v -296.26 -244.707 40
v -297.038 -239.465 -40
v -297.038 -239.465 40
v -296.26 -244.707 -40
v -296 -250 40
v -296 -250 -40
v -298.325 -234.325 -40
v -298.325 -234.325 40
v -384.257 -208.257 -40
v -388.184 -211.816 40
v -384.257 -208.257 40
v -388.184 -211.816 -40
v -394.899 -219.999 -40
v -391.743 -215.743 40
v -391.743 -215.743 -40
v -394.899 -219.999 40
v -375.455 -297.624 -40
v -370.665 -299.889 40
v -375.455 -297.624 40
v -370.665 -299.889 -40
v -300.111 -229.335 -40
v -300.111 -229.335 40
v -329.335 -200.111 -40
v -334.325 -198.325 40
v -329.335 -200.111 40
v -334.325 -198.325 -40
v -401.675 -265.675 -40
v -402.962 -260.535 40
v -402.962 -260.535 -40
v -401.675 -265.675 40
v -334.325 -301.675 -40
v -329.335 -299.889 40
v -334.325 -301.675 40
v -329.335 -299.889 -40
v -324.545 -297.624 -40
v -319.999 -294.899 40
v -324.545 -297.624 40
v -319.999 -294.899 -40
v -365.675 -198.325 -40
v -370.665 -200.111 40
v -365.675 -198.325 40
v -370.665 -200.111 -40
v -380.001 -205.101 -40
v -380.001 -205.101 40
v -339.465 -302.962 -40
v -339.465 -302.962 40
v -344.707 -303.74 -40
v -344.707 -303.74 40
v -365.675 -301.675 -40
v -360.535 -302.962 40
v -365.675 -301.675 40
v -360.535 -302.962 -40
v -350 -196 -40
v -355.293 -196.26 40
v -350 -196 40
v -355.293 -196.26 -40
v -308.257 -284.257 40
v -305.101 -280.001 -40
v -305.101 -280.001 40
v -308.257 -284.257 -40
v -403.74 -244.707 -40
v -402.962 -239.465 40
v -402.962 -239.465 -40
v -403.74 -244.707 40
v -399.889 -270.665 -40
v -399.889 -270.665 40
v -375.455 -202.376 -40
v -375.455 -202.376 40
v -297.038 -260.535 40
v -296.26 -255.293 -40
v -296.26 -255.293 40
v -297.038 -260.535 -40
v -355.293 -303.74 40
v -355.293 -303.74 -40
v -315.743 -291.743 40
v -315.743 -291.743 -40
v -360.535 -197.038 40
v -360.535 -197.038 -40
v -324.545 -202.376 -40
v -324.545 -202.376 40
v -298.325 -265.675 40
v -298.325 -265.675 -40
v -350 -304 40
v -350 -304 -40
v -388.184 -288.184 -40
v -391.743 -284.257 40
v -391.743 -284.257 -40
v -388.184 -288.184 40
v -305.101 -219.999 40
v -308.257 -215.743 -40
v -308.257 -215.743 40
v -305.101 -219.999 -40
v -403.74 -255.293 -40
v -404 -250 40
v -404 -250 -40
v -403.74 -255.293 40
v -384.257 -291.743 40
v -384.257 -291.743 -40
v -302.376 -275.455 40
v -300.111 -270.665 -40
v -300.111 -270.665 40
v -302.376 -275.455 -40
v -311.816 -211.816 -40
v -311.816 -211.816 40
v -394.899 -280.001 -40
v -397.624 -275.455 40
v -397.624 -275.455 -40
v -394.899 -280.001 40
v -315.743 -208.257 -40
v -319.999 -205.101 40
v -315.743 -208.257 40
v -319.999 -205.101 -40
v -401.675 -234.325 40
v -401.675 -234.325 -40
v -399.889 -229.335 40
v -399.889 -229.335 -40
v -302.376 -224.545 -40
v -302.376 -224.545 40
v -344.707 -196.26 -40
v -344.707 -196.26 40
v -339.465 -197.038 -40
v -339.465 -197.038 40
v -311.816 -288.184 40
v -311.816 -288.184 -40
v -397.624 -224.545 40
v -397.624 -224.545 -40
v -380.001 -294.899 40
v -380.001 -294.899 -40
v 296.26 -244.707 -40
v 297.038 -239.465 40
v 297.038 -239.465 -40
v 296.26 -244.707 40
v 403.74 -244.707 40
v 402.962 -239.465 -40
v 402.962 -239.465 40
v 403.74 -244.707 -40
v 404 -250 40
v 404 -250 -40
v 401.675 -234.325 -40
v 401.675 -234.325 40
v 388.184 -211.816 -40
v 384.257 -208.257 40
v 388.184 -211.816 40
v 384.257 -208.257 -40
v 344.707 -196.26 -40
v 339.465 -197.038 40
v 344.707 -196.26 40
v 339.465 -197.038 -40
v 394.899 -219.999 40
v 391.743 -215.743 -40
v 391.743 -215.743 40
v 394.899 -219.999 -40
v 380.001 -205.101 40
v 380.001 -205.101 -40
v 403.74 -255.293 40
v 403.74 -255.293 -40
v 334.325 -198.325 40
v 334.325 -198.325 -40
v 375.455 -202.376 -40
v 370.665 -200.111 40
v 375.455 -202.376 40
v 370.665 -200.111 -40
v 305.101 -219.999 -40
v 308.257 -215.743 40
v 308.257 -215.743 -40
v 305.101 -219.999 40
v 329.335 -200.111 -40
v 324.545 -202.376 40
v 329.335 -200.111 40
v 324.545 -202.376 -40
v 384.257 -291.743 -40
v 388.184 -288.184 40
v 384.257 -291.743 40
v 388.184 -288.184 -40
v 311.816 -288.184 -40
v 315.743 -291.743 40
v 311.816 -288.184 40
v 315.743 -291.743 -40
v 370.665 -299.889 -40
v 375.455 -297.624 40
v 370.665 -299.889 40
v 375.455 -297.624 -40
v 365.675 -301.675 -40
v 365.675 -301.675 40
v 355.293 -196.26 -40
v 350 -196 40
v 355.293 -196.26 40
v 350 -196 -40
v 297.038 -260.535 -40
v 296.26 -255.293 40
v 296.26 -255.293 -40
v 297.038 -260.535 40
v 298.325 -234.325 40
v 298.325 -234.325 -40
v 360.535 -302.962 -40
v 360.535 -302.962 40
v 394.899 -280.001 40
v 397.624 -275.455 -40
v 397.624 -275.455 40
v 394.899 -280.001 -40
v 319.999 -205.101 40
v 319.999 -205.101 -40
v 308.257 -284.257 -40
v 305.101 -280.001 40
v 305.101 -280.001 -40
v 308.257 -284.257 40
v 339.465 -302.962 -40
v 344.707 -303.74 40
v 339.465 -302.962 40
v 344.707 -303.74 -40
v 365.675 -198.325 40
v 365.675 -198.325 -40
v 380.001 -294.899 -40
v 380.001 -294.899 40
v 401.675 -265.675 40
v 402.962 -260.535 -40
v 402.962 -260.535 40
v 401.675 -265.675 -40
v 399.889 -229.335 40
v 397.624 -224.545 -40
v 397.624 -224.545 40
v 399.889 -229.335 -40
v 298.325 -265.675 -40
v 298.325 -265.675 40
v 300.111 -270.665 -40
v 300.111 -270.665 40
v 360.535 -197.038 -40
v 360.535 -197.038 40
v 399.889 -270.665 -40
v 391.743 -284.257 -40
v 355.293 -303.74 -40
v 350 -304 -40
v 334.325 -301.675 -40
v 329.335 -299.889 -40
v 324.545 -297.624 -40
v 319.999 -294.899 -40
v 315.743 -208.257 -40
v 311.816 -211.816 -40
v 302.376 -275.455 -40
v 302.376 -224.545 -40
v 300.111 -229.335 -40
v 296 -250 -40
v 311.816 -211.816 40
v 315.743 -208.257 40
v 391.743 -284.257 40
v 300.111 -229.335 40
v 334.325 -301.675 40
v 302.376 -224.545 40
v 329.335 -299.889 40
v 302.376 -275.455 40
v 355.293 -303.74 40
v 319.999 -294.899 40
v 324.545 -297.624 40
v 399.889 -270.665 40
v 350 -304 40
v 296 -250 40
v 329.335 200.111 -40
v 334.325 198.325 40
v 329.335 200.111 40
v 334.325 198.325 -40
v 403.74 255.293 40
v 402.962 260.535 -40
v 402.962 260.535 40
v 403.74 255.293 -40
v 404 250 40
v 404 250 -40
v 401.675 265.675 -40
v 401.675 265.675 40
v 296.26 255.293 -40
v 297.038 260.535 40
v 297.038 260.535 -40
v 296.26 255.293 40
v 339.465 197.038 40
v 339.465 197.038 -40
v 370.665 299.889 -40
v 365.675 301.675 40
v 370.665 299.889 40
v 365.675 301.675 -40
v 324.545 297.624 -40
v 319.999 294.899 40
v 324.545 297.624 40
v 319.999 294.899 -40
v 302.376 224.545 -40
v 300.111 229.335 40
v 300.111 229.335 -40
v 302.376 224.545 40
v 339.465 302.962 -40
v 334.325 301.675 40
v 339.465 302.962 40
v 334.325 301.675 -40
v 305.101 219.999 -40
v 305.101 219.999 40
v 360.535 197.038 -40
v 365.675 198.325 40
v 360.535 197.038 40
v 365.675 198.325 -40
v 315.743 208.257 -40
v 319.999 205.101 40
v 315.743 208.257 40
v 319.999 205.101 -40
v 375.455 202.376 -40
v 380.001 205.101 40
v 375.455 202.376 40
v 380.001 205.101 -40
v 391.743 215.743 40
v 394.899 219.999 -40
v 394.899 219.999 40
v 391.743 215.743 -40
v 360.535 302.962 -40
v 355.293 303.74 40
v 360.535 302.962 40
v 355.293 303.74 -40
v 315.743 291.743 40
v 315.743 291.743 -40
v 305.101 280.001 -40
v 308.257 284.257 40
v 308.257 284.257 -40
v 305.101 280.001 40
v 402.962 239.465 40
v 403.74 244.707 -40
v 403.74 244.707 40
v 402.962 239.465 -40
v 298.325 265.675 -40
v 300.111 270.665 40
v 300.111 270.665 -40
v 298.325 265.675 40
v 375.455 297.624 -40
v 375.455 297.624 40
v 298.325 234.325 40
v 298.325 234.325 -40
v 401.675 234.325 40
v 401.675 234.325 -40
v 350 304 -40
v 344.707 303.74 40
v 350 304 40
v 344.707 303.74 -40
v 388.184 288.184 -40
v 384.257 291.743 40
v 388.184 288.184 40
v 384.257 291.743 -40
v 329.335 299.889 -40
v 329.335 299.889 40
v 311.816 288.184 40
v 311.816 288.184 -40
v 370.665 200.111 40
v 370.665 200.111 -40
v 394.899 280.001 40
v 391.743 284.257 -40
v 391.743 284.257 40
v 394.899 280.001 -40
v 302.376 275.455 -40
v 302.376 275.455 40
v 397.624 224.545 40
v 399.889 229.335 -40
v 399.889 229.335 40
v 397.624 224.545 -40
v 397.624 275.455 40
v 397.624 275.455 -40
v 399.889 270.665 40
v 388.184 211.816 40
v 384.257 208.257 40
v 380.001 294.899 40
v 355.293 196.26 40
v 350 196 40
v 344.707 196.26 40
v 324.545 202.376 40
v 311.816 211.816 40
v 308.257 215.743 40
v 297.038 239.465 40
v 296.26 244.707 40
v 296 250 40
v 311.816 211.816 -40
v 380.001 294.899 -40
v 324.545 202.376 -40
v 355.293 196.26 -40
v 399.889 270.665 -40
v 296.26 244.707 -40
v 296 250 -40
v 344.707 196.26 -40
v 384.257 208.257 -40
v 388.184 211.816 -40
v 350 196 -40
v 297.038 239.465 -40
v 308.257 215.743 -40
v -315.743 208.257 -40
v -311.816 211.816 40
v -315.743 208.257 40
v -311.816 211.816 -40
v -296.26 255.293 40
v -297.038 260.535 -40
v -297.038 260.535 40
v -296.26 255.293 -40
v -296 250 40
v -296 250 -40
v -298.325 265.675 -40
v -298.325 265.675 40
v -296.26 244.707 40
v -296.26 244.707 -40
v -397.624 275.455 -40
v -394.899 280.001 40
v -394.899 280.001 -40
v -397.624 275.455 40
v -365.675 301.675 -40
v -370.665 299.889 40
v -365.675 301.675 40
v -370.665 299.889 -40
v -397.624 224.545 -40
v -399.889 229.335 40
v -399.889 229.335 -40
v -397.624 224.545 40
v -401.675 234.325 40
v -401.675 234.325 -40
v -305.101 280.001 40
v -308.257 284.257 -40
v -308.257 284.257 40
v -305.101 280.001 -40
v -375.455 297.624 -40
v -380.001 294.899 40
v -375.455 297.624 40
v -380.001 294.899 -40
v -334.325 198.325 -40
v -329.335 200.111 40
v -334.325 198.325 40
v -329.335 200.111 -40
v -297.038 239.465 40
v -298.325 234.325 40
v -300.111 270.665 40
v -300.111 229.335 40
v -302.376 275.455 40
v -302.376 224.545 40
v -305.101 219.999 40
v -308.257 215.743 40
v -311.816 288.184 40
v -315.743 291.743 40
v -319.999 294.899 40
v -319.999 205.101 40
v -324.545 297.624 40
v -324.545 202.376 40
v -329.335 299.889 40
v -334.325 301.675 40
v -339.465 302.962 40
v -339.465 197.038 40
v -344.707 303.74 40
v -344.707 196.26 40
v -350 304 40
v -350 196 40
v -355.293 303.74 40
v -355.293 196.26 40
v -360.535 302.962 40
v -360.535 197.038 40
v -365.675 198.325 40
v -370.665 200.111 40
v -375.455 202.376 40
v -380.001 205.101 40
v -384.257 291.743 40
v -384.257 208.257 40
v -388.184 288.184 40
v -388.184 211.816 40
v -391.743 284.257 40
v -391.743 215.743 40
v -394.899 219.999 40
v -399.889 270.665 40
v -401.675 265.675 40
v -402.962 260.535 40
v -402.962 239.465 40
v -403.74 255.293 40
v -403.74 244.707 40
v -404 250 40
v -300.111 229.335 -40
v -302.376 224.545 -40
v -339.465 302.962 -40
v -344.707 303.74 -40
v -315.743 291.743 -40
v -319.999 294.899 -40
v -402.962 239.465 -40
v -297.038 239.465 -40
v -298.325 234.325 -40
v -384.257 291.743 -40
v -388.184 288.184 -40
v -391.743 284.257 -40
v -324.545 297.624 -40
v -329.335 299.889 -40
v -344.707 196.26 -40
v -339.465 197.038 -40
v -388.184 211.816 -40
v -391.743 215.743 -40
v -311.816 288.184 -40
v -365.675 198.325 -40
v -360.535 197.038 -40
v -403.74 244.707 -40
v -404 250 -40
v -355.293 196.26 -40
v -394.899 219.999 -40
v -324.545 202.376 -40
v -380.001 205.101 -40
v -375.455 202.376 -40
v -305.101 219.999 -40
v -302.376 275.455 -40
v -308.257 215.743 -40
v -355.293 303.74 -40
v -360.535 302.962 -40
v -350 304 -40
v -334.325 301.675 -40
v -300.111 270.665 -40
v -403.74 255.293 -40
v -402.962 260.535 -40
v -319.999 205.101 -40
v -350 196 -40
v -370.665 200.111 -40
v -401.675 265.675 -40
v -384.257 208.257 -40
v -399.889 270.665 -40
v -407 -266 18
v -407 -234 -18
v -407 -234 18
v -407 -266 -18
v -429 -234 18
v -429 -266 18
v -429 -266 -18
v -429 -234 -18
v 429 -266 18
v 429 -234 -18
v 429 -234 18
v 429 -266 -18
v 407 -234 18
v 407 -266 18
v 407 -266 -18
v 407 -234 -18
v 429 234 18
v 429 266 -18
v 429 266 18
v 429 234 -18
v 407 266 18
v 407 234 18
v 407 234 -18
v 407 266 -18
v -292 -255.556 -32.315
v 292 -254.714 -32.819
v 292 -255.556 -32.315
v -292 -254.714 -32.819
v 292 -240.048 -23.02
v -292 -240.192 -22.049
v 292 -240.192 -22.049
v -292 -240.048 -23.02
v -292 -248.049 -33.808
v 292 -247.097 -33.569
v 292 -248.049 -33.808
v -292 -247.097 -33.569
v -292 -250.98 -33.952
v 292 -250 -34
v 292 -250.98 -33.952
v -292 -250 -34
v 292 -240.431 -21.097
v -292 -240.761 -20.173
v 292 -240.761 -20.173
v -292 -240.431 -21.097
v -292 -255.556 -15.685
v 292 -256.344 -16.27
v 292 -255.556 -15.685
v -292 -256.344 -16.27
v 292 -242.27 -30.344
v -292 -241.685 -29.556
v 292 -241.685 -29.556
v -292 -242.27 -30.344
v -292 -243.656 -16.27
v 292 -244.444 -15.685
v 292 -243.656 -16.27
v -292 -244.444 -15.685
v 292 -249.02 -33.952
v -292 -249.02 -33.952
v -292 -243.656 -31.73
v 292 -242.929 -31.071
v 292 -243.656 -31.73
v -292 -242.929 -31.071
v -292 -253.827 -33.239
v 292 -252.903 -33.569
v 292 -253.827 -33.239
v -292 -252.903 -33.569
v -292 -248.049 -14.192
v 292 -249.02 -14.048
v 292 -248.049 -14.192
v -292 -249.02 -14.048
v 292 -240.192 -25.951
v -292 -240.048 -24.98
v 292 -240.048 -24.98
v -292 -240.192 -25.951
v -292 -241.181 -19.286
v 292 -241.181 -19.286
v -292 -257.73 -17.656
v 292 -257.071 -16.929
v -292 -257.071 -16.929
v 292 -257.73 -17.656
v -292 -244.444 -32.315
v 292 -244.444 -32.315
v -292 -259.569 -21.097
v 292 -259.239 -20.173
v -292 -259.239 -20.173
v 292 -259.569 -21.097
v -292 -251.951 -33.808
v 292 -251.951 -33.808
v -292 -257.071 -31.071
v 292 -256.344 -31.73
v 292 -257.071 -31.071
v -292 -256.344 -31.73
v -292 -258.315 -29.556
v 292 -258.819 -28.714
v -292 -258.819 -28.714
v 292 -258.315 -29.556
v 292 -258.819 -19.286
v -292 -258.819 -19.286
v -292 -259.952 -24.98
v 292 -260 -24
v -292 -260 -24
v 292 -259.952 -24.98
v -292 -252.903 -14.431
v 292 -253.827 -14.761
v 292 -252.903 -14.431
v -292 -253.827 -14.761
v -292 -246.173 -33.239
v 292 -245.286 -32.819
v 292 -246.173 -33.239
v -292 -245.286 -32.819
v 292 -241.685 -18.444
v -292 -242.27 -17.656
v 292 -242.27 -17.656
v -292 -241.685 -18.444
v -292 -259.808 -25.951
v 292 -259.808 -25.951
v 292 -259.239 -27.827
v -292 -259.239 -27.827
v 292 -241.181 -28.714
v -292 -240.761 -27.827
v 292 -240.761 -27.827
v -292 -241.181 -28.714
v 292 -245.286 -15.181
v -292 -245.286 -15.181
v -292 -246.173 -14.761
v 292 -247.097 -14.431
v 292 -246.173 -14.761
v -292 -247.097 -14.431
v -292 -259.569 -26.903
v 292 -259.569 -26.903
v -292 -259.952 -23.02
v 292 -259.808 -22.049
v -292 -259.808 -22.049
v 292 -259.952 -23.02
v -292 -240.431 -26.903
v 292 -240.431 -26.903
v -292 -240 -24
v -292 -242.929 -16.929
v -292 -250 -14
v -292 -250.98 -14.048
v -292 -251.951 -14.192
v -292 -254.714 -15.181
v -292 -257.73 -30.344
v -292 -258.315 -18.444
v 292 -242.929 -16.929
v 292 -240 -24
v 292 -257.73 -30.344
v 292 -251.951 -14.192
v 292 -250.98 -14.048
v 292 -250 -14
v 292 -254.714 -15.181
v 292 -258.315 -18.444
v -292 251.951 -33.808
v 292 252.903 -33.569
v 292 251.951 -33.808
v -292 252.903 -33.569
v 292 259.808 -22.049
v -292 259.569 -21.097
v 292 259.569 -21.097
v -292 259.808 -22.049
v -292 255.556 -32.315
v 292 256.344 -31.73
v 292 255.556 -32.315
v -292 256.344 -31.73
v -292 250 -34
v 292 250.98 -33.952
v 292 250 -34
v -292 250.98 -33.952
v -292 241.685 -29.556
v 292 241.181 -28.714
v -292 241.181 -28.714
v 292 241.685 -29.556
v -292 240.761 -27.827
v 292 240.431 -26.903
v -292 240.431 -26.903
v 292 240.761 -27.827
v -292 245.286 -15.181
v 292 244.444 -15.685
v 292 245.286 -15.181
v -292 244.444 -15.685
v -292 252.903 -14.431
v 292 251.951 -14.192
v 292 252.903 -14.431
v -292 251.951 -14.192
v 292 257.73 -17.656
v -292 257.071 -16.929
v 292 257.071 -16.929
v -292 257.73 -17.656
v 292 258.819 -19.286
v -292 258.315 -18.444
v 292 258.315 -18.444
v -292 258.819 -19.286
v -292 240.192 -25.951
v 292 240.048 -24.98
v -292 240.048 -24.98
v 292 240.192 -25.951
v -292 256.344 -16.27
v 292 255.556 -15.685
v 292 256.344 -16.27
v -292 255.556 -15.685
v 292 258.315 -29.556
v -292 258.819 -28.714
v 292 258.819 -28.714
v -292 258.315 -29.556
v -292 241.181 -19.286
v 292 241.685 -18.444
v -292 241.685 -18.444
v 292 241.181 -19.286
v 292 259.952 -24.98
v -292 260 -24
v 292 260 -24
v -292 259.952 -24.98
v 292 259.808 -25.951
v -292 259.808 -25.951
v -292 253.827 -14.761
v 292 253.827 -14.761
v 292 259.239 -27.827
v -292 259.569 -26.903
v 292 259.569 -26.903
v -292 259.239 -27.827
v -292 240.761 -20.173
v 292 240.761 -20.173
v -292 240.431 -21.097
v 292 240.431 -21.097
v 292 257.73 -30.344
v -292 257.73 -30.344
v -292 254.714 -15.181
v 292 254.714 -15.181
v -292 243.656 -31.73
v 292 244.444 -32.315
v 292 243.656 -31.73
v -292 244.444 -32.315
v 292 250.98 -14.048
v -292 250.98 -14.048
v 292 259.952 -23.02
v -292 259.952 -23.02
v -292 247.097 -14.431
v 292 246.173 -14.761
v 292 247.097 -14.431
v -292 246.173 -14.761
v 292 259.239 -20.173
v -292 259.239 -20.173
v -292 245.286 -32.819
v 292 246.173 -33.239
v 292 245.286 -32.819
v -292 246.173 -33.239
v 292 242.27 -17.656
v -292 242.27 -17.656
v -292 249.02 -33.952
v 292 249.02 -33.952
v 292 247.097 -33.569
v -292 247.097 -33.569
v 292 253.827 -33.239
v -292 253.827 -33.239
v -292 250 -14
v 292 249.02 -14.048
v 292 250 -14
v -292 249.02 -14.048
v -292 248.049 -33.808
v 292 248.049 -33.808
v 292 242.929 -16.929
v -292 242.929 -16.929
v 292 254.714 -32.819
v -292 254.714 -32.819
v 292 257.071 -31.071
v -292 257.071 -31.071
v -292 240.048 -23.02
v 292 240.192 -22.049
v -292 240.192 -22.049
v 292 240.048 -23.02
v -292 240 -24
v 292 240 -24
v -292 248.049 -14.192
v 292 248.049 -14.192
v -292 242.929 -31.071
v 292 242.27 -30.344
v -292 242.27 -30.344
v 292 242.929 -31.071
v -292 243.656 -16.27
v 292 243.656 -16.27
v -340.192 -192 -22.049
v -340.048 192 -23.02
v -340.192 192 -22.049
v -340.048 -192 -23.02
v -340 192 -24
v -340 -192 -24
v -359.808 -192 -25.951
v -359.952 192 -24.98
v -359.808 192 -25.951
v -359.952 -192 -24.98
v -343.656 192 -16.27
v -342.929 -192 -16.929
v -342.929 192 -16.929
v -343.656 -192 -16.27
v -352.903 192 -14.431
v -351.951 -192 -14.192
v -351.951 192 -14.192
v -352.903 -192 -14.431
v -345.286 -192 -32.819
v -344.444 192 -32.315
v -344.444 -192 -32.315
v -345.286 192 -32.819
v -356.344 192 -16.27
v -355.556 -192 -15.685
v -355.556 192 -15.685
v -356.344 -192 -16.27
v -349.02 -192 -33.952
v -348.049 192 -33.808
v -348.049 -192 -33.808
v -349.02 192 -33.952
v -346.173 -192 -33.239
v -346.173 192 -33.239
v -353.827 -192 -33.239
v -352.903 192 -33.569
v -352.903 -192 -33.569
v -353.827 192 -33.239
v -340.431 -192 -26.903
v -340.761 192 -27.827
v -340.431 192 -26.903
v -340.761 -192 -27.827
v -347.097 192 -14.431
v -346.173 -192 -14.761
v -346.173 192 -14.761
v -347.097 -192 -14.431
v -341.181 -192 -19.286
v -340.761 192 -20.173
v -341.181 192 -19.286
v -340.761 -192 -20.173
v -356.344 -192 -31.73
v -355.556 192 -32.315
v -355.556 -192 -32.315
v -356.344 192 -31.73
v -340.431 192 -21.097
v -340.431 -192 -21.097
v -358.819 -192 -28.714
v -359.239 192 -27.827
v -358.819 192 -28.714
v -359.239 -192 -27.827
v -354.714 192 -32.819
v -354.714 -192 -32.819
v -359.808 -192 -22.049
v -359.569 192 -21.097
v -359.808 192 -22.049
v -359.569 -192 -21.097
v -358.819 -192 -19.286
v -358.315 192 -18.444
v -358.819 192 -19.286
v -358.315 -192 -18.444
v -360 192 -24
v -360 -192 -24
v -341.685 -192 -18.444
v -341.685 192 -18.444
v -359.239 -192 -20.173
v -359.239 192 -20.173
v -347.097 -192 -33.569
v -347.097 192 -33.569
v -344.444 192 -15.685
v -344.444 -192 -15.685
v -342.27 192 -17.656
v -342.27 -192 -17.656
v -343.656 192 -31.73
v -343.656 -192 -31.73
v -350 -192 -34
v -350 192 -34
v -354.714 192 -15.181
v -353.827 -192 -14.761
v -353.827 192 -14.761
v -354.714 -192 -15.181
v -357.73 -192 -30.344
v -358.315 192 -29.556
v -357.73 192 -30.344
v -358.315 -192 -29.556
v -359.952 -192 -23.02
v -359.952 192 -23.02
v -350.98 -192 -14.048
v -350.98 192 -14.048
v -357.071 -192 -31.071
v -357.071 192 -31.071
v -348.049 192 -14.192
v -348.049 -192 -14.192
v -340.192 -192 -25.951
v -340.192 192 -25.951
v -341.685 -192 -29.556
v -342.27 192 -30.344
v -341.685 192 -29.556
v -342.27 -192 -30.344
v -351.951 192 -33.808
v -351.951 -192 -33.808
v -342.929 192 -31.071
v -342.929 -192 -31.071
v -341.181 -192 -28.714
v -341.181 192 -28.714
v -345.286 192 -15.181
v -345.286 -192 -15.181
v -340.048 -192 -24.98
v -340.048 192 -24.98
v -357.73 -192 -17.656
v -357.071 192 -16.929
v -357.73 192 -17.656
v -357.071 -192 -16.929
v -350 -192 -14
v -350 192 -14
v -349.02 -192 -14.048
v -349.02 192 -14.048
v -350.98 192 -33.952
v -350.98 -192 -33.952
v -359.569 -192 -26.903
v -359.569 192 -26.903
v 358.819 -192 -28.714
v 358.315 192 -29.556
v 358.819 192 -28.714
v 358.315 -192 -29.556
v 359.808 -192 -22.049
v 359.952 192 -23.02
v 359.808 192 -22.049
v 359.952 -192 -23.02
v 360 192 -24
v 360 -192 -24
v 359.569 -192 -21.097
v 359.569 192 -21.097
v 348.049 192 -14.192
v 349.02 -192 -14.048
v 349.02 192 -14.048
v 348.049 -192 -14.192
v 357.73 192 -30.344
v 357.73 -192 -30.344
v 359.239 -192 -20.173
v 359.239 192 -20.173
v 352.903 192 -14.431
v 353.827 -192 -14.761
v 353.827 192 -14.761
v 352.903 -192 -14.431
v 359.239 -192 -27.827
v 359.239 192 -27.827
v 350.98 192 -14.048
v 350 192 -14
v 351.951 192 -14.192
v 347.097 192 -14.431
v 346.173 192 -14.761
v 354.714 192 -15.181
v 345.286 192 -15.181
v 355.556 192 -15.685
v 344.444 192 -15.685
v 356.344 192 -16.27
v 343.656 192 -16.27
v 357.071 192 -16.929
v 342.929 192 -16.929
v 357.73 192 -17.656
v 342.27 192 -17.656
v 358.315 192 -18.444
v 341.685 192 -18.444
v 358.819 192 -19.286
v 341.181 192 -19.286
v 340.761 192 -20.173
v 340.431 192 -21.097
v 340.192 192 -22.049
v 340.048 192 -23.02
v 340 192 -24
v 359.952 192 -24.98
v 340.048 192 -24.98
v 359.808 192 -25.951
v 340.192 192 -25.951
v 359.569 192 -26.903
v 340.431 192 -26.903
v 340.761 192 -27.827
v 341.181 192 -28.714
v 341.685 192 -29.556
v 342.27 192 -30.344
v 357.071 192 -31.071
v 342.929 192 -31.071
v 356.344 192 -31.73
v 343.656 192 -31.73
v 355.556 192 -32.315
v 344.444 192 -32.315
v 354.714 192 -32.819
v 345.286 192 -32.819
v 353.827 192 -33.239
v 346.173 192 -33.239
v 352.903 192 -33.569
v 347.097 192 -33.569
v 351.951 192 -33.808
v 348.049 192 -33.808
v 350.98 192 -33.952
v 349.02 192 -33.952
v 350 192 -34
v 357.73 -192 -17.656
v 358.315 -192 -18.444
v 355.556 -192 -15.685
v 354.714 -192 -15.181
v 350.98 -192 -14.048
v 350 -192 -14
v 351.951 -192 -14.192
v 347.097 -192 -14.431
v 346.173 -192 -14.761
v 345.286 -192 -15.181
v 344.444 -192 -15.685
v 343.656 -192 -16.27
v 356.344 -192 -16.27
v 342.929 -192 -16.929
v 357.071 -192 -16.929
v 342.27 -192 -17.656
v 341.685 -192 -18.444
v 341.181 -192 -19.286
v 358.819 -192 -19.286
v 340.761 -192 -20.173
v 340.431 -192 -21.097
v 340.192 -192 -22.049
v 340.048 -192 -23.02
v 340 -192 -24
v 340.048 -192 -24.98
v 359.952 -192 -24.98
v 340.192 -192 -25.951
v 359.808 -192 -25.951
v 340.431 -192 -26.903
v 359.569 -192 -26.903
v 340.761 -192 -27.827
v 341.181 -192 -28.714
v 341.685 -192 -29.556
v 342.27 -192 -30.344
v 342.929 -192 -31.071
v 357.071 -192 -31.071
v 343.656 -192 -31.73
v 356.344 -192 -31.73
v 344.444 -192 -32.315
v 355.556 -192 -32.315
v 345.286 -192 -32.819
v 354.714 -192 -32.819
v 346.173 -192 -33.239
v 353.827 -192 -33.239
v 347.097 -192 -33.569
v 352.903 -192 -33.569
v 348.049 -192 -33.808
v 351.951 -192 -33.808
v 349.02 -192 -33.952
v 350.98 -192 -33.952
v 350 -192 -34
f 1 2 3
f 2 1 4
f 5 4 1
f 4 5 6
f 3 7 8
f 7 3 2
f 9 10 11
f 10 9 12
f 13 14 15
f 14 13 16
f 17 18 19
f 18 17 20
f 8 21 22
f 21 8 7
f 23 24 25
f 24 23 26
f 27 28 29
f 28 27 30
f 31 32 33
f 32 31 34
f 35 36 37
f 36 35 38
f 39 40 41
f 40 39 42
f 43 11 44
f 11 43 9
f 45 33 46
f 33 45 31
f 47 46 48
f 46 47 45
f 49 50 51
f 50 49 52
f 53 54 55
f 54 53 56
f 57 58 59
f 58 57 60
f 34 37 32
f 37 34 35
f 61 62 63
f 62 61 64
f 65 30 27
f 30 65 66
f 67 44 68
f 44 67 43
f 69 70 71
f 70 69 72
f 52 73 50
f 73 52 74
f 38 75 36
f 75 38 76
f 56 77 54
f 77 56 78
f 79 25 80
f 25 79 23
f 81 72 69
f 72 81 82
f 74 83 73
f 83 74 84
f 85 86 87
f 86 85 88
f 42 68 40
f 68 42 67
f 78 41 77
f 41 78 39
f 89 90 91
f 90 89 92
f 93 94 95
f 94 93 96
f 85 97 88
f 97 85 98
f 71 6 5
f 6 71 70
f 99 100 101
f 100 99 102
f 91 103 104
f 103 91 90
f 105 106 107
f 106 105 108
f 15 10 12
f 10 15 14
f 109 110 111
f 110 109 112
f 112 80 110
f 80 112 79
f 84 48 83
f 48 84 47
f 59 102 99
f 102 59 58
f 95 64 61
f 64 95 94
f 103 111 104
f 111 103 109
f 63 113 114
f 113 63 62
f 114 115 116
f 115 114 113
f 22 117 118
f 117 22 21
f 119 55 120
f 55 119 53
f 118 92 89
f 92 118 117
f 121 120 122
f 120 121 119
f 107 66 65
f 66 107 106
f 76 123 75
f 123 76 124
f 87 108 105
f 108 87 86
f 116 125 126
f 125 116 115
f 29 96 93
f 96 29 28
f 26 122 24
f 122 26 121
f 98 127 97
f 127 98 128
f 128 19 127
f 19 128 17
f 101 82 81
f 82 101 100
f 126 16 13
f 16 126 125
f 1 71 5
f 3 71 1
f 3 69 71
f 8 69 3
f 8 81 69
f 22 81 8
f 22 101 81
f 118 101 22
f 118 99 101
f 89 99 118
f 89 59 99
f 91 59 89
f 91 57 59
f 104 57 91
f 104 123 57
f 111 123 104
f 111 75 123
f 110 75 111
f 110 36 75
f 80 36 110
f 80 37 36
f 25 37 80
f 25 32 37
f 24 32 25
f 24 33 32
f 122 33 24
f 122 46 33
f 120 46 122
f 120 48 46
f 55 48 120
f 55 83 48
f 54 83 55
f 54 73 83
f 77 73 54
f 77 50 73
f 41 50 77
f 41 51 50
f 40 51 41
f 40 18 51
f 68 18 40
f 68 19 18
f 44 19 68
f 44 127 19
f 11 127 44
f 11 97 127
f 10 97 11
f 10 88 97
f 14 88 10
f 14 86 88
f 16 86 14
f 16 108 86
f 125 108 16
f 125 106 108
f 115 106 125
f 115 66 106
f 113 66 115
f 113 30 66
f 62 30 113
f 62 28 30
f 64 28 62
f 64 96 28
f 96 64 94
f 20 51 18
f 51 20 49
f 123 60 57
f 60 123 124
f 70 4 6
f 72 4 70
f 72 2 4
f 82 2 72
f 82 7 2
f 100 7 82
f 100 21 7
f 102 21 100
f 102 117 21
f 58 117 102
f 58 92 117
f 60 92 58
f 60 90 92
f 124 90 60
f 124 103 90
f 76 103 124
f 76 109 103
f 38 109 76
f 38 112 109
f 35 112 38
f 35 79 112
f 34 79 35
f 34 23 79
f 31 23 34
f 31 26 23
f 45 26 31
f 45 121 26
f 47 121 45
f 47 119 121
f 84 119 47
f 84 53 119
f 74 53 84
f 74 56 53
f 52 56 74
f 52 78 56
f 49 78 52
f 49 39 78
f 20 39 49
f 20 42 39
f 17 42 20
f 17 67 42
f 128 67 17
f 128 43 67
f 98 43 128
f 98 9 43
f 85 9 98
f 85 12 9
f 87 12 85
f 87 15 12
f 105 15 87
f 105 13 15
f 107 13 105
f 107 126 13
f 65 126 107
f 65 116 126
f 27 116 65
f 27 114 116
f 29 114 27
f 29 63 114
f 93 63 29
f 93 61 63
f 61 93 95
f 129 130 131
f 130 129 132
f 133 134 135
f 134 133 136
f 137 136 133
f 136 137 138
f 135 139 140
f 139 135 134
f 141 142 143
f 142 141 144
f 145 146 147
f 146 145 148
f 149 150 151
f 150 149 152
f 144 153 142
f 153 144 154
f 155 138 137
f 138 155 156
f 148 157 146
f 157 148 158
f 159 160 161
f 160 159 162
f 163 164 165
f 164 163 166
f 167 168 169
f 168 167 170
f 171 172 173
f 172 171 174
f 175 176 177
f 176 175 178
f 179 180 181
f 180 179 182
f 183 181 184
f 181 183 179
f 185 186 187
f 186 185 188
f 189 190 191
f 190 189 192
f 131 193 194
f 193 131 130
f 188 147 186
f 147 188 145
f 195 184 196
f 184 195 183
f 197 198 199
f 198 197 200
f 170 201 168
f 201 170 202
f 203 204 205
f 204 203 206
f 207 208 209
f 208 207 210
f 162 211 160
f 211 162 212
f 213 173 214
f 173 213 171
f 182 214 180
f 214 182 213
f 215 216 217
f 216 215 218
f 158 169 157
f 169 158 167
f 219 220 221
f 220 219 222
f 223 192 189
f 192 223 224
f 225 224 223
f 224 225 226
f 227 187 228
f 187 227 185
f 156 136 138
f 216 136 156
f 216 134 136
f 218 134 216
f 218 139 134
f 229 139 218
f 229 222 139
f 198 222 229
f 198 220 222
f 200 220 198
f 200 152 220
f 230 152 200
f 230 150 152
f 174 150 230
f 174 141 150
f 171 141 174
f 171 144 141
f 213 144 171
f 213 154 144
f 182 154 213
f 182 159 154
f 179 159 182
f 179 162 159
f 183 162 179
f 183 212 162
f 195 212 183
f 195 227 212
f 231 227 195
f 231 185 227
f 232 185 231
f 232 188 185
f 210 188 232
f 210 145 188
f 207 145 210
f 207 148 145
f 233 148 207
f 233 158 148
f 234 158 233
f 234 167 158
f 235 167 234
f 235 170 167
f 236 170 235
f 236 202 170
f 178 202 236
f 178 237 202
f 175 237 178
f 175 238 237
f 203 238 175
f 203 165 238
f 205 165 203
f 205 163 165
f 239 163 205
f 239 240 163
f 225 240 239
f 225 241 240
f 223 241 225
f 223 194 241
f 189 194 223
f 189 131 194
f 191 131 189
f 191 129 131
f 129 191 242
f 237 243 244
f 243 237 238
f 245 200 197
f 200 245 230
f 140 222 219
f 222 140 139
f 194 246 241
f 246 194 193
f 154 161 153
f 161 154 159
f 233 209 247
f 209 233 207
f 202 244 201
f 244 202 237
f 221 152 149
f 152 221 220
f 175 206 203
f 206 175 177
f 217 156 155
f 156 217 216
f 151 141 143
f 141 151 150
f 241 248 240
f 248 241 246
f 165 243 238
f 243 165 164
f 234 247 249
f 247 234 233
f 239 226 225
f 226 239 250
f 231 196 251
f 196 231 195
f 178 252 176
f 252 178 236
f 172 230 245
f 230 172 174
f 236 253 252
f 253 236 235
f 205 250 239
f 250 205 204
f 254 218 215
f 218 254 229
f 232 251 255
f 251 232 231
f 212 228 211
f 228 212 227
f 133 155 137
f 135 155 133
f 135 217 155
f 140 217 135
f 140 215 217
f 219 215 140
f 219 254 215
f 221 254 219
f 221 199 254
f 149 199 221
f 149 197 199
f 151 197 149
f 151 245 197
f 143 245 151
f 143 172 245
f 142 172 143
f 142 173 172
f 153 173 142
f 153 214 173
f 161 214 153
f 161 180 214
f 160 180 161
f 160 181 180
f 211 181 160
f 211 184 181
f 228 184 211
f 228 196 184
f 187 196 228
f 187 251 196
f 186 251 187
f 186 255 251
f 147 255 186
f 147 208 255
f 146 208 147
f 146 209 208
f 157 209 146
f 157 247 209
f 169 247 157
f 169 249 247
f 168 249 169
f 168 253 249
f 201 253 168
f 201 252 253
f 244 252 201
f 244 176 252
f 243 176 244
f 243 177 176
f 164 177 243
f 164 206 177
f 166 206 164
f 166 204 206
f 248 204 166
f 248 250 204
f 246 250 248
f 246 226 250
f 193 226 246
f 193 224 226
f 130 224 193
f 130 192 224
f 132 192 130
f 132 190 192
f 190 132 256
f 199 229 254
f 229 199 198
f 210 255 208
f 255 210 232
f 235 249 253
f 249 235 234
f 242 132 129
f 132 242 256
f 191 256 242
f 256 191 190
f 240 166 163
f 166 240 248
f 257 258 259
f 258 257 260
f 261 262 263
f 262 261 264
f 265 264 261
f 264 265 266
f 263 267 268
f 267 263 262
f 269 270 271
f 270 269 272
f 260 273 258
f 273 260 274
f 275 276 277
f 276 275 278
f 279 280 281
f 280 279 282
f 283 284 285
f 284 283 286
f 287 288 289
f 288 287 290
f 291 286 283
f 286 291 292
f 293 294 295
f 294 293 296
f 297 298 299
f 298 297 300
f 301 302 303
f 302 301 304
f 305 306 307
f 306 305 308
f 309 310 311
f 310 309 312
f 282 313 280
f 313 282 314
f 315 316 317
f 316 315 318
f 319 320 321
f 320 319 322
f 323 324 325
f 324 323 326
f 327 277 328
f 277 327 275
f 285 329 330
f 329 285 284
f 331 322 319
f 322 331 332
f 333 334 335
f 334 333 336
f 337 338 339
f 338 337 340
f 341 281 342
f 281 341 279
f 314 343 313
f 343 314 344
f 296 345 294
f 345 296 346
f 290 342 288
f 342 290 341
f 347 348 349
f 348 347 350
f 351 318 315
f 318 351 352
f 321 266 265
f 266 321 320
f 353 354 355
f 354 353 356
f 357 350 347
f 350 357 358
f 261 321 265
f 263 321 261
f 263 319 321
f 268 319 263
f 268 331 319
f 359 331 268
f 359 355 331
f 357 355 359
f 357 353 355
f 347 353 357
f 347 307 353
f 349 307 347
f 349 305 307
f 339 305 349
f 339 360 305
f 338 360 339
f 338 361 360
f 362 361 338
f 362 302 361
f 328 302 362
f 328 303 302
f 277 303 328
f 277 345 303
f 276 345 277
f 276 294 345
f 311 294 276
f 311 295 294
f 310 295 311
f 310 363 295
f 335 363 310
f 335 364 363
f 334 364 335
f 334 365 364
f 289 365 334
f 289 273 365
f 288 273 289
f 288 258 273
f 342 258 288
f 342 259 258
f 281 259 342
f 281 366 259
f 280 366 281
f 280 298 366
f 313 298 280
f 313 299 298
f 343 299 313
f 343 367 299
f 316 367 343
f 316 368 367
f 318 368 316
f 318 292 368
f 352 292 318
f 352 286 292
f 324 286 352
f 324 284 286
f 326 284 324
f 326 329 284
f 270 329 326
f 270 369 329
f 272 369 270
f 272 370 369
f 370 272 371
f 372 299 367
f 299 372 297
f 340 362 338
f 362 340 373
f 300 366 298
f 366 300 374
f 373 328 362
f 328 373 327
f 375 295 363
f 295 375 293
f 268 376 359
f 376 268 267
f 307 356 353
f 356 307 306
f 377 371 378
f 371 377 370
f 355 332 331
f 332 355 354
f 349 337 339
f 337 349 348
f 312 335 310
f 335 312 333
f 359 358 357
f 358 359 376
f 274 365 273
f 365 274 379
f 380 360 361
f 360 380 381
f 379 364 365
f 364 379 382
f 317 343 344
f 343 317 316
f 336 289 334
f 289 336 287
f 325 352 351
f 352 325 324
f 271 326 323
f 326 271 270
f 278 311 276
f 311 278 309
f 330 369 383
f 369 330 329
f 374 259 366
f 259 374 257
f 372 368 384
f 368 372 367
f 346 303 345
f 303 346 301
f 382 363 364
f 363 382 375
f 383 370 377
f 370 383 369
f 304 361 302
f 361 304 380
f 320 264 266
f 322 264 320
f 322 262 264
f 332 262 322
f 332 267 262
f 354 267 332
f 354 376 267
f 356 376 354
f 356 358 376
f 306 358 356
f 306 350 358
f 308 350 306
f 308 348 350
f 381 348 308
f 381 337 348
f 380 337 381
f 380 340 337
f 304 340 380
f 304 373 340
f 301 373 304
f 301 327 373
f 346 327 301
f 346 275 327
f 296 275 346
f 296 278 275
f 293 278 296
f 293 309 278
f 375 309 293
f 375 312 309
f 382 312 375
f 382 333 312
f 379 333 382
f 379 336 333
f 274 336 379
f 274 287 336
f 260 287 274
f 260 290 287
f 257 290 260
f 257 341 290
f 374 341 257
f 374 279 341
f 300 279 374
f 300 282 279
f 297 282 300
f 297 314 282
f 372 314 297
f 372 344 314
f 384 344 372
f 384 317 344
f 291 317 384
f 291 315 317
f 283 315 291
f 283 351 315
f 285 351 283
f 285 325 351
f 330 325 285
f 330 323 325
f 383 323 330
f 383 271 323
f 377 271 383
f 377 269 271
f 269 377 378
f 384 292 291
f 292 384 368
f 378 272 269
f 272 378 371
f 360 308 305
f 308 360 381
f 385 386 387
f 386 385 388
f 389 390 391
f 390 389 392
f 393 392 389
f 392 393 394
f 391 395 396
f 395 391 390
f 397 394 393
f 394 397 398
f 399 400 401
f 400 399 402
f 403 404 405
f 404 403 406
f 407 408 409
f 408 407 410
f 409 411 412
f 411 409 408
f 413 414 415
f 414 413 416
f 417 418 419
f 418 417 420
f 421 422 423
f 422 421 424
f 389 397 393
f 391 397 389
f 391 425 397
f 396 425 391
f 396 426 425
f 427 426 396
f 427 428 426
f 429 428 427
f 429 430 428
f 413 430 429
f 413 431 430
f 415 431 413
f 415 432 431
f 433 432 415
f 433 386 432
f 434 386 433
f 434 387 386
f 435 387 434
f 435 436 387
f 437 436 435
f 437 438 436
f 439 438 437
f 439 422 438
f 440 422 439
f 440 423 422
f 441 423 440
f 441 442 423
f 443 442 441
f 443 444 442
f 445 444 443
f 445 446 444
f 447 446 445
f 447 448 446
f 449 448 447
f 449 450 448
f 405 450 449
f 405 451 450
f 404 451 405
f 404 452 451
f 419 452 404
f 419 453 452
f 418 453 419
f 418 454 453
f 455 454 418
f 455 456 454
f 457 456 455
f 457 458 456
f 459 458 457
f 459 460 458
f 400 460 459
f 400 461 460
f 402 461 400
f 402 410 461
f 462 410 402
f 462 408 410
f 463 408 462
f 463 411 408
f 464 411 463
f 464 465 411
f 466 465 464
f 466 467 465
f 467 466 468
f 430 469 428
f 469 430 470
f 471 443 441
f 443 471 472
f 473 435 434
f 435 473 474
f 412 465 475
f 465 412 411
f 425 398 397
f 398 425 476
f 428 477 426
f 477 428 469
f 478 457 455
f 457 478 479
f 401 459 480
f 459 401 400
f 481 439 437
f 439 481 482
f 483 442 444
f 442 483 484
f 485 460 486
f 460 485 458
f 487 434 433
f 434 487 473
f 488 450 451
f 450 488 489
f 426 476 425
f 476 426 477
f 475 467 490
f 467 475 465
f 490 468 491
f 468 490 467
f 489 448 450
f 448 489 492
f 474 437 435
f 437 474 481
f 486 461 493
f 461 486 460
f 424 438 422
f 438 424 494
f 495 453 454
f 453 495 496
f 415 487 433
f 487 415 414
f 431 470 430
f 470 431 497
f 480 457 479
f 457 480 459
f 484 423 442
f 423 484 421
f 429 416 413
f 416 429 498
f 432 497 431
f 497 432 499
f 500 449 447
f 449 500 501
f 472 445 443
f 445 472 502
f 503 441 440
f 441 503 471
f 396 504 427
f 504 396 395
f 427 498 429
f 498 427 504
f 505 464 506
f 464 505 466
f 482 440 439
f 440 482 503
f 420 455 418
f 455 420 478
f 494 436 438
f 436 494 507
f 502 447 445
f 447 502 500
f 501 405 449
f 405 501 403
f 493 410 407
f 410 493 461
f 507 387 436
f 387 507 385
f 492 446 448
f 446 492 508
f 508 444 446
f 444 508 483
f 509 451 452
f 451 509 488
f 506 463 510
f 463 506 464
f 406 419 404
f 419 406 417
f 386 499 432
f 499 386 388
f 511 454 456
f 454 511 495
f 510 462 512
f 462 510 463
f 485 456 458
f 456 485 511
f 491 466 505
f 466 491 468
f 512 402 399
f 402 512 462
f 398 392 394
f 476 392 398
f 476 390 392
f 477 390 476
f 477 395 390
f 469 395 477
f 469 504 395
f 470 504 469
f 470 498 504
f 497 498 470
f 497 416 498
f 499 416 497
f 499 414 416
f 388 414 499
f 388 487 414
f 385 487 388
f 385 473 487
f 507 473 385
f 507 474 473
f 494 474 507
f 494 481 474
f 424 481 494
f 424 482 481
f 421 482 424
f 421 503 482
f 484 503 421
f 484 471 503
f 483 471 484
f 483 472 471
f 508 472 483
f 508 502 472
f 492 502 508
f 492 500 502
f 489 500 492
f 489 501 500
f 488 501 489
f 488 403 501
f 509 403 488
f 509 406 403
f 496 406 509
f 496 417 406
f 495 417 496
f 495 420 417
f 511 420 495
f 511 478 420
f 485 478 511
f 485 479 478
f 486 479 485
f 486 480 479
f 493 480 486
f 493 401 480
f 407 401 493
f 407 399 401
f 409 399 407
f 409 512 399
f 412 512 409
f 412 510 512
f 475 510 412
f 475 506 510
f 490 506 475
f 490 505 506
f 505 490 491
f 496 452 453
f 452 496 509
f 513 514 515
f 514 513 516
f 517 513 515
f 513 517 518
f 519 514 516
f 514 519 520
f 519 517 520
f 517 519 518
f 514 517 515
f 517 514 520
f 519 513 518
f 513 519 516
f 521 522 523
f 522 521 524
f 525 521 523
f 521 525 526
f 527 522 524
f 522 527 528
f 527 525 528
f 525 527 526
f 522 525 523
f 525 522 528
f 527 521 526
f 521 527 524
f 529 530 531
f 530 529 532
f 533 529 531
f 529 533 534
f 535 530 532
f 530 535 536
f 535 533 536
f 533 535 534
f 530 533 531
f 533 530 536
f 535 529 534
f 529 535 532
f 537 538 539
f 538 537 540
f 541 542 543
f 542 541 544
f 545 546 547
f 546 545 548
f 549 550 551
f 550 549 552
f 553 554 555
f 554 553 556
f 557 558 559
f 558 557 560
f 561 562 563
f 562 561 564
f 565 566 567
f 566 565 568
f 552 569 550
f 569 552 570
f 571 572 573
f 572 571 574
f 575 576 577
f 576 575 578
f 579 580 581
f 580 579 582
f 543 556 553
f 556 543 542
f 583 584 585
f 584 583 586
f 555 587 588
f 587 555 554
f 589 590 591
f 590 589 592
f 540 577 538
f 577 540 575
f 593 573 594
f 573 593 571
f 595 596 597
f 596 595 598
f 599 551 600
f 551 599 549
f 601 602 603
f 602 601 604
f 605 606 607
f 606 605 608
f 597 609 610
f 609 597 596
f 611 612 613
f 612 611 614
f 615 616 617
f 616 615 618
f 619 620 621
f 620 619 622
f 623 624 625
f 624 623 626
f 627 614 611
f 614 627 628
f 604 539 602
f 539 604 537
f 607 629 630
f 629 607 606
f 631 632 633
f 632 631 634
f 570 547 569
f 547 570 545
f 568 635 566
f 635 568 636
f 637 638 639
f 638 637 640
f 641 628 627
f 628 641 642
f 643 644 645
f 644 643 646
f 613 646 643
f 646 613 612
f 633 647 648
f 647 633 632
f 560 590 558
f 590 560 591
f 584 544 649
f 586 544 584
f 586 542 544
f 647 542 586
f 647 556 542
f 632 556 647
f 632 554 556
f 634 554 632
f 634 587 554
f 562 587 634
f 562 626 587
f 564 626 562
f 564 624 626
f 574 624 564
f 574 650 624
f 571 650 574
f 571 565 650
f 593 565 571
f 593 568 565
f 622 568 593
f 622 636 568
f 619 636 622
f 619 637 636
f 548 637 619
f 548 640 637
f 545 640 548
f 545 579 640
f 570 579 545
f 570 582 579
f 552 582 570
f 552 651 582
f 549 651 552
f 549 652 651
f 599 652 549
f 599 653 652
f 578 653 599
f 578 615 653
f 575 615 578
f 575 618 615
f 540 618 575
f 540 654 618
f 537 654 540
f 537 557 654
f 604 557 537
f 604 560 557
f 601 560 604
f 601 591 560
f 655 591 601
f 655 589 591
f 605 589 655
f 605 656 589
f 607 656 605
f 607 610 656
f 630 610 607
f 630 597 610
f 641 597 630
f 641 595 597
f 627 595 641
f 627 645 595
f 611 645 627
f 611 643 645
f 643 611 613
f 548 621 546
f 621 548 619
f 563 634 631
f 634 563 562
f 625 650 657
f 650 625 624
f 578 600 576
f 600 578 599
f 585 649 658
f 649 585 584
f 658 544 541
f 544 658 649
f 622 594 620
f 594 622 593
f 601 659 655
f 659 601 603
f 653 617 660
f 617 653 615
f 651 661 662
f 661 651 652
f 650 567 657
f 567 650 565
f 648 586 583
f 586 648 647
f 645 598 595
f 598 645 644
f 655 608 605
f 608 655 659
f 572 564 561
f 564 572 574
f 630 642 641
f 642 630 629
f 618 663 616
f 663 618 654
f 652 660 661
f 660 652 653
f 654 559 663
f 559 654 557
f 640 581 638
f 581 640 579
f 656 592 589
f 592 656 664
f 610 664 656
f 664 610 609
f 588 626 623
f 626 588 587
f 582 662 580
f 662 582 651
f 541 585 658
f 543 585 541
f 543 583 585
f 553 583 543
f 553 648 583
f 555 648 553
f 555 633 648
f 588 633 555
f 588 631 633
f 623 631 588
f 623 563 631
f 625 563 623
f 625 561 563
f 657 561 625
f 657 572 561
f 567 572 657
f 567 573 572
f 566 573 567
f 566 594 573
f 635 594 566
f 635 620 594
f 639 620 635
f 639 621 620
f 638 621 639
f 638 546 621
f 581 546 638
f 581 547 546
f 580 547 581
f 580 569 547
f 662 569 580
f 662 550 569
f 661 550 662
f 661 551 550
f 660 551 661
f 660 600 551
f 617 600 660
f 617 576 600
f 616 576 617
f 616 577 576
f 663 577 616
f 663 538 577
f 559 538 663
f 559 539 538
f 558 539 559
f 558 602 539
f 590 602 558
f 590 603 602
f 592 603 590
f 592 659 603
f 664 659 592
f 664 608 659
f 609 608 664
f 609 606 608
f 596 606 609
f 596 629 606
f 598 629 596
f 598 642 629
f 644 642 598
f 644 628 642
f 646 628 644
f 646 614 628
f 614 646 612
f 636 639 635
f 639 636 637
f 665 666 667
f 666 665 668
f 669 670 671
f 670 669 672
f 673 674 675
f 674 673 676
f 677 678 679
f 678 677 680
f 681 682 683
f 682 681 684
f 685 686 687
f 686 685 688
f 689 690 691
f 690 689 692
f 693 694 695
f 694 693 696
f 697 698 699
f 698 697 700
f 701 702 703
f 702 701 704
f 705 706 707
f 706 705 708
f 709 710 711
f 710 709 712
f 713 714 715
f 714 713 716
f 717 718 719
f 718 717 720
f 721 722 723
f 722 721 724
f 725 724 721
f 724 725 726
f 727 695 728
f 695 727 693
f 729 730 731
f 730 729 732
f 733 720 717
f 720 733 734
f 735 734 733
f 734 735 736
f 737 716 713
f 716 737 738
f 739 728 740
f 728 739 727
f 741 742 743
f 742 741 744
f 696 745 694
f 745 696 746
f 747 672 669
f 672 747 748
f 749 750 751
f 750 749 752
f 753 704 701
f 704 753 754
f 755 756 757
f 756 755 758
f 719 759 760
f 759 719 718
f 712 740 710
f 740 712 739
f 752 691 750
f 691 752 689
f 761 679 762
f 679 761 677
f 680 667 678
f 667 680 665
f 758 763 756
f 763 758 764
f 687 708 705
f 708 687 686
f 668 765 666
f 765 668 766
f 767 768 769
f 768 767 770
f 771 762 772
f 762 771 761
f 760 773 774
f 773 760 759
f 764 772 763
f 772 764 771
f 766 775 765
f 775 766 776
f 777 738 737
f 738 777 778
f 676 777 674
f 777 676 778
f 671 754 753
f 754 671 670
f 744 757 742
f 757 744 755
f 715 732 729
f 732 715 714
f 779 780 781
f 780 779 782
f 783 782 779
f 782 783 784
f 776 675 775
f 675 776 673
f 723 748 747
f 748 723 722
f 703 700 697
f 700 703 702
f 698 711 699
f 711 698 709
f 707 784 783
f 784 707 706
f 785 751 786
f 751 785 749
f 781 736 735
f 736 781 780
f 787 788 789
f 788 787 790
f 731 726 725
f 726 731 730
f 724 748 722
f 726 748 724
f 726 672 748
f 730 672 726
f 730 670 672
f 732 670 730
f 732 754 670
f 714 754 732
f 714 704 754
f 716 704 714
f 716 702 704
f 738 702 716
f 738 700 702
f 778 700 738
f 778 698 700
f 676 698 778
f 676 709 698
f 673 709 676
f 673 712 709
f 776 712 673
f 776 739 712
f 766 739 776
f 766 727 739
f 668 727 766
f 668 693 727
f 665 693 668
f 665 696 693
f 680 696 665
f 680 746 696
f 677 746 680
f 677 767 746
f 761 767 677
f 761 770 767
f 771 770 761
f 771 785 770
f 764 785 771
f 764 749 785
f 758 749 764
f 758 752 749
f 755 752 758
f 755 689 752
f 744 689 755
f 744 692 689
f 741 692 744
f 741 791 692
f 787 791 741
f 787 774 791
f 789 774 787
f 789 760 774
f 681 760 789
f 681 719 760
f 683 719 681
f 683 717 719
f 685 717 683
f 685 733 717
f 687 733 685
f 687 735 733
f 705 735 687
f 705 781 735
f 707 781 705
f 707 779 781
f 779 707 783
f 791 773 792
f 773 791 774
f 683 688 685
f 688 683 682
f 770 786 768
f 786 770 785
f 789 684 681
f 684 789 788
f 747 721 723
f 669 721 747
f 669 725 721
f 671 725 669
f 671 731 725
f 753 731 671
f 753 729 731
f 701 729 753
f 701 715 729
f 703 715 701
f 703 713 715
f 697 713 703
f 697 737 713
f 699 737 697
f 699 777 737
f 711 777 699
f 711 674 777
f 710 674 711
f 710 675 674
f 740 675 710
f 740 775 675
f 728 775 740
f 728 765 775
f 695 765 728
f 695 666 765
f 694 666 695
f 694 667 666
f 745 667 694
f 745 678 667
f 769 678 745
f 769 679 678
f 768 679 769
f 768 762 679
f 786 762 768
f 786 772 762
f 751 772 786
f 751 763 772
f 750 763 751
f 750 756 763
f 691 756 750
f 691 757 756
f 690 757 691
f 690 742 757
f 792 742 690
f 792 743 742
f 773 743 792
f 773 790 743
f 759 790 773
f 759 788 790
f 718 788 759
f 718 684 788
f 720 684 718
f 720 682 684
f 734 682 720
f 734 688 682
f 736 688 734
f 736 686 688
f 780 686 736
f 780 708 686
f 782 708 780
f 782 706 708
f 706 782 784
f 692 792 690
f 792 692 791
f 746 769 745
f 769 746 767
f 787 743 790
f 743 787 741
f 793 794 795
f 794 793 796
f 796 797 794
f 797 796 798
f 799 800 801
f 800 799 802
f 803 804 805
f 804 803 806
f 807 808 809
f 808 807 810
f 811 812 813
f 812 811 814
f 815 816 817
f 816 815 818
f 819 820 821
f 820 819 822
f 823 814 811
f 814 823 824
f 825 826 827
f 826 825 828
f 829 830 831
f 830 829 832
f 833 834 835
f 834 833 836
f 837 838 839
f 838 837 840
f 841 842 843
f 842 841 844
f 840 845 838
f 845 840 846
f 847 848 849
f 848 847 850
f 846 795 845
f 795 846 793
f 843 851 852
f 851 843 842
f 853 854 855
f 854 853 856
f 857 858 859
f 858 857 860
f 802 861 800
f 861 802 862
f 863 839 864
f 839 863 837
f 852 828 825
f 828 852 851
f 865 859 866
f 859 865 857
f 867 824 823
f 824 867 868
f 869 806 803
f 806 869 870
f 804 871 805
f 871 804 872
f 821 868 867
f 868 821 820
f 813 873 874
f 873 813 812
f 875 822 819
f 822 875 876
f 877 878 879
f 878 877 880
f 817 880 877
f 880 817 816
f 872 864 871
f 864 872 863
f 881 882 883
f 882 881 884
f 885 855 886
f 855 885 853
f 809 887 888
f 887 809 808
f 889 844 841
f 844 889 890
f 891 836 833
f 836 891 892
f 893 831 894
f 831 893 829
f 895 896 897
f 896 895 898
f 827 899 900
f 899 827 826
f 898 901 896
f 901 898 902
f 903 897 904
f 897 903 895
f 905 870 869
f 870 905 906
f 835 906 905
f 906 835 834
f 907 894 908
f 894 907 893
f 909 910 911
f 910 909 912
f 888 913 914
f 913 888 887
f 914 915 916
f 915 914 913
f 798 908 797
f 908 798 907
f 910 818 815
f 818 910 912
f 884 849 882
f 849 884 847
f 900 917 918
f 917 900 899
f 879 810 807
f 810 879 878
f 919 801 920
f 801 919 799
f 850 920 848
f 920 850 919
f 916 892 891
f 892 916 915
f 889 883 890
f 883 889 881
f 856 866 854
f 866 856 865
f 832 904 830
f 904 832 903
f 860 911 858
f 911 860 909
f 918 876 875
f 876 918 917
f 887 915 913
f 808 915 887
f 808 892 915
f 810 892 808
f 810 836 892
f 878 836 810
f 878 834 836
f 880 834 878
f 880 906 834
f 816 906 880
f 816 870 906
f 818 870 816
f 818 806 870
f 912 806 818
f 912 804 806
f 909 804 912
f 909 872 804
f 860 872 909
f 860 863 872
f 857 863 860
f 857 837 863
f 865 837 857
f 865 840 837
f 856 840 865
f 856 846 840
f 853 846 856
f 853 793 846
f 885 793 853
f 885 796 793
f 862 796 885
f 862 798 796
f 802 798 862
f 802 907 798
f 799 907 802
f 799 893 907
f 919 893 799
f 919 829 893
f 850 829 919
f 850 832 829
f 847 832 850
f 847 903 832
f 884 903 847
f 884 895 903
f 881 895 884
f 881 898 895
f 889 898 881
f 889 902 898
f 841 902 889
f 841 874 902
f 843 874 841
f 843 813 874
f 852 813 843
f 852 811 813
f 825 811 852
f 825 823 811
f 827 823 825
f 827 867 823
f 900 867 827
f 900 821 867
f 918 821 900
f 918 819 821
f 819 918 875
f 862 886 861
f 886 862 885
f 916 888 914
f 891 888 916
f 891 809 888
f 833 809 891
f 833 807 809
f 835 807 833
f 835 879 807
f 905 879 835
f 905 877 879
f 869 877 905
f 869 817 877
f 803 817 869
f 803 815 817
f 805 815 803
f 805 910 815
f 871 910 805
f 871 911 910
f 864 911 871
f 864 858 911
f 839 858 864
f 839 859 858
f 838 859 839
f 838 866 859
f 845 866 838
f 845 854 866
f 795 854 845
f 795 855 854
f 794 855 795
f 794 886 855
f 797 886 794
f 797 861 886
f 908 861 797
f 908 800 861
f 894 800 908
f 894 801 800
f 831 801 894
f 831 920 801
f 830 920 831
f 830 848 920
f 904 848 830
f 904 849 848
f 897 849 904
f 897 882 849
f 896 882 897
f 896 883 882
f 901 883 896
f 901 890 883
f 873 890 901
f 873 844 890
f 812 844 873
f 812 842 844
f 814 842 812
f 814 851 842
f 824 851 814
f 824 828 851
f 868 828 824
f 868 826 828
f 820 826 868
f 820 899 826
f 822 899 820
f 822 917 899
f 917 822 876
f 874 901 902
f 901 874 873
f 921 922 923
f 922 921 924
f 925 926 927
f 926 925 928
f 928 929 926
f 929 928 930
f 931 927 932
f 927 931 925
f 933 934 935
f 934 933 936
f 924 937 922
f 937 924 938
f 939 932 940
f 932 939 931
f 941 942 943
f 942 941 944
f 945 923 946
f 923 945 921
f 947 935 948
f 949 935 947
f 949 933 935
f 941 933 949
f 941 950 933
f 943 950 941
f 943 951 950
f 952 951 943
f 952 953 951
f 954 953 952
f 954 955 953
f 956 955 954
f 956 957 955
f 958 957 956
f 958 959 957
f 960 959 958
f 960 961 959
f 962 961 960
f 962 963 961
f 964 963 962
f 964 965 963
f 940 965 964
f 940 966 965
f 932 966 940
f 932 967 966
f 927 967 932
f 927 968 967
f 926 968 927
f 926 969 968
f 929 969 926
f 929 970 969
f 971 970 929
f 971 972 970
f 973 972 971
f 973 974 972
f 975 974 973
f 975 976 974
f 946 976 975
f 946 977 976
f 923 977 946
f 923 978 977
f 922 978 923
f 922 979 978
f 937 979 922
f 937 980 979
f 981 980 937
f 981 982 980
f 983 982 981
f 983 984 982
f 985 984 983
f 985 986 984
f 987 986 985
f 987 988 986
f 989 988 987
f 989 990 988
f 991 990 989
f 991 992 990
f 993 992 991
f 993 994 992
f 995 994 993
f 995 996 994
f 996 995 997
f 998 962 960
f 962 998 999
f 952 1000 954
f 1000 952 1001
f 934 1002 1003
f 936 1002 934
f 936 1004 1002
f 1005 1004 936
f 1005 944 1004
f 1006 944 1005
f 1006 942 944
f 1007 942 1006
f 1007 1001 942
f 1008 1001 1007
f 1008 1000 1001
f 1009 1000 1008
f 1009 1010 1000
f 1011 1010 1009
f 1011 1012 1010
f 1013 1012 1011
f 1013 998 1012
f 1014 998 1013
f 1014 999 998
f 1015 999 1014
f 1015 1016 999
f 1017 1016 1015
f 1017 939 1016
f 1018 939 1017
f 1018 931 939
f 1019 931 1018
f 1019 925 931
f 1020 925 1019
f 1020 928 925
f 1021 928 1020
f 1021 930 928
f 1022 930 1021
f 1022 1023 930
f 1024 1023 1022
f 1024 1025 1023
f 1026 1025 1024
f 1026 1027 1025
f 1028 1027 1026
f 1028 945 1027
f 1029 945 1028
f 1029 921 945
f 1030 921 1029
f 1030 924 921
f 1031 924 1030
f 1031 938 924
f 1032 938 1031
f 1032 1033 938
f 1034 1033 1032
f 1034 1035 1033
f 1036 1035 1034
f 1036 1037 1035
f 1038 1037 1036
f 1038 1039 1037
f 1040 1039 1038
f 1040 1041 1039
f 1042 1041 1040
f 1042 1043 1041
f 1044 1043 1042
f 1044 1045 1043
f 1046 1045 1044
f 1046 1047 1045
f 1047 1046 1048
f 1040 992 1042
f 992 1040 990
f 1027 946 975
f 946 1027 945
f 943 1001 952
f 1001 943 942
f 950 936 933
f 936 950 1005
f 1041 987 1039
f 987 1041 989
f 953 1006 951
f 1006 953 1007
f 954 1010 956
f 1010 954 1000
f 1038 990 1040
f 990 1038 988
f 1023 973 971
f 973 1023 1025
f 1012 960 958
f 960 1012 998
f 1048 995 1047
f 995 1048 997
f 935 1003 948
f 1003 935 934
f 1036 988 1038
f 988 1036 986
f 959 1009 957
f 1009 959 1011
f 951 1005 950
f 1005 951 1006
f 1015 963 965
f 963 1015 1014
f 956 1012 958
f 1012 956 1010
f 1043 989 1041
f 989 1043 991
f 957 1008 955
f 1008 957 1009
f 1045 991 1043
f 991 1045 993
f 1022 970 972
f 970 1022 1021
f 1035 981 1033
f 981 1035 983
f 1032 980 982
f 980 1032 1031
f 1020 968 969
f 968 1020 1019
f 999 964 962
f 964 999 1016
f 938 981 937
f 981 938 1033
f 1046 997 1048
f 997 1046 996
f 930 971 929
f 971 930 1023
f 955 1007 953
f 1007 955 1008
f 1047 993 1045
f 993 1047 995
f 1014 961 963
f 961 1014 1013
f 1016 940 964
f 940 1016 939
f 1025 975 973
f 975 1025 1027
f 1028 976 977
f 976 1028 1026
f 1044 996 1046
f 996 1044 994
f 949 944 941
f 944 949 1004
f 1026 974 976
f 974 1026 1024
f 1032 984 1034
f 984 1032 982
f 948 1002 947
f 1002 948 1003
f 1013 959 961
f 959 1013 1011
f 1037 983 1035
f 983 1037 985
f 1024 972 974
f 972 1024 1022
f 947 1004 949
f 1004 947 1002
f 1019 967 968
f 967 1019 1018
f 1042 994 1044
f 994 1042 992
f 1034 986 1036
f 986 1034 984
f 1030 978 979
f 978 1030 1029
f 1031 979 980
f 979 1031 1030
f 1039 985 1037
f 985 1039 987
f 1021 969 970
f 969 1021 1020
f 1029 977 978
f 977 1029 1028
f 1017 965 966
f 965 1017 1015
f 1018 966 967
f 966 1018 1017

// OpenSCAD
// ============================================================================
// Atom Lithography Machine — Parametric OpenSCAD Module (S4.1-02)
// ============================================================================
// part_id           : S4.1-02
// parent_bom_id     : S4.1
// subsystem         : S4
// part_name         : Pnomatik dusuk-frekansli hava yayli izolatör seti (4 ayak)
// material          : 304 SS
// temp_stage        : 300 K
// vacuum_grade      : Atmosfer
// tolerance         : ±0.1 mm seviye
// computed_mass_kg  : 6.64907
// envelope_mm       : 858.000 x 612.000 x 80.000
// design_maturity   : M0_M1_DETAILED_CAD_DESIGN_ONLY
// no_lab_measurement: true
// iec61508_certified: false
// semi_s2_certified : false
// Units: millimeters (mm)
// ============================================================================

$fn = 64;

// Nominal bounding envelope parameters (mm)
bbox_x = 858.0000;
bbox_y = 612.0000;
bbox_z = 80.0000;

// Part-specific parametric dimensions
n_isolators = 4;
span_x_mm = 700.0;
span_y_mm = 500.0;
isolator_h_mm = 80.0;
corner_freq_hz = 1.5;

// Interface / port parameters (mm)

module part_S4_1_02() {
  union() {
    // Pneumatic air-spring isolator #1 (1.0-2.0 Hz)
    translate([-350.000, -250.000, 0.000]) cylinder(d=108.000, h=80.000, center=true);
    // Pneumatic air-spring isolator #2 (1.0-2.0 Hz)
    translate([350.000, -250.000, 0.000]) cylinder(d=108.000, h=80.000, center=true);
    // Pneumatic air-spring isolator #3 (1.0-2.0 Hz)
    translate([350.000, 250.000, 0.000]) cylinder(d=108.000, h=80.000, center=true);
    // Pneumatic air-spring isolator #4 (1.0-2.0 Hz)
    translate([-350.000, 250.000, 0.000]) cylinder(d=108.000, h=80.000, center=true);
    // Auto-leveling pneumatic valve #1
    translate([-418.000, -250.000, 0.000]) cube([22.000, 32.000, 36.000], center=true);
    // Auto-leveling pneumatic valve #2
    translate([418.000, -250.000, 0.000]) cube([22.000, 32.000, 36.000], center=true);
    // Auto-leveling pneumatic valve #3
    translate([418.000, 250.000, 0.000]) cube([22.000, 32.000, 36.000], center=true);
    // Perimeter structural tie-bar #1
    translate([0.000, -250.000, -24.000]) rotate([0.000, 90.000, 0.000]) cylinder(d=20.000, h=584.000, center=true);
    // Perimeter structural tie-bar #2
    translate([0.000, 250.000, -24.000]) rotate([0.000, 90.000, 0.000]) cylinder(d=20.000, h=584.000, center=true);
    // Perimeter structural tie-bar #3
    translate([-350.000, 0.000, -24.000]) rotate([90.000, 0.000, 0.000]) cylinder(d=20.000, h=384.000, center=true);
    // Perimeter structural tie-bar #4
    translate([350.000, 0.000, -24.000]) rotate([90.000, 0.000, 0.000]) cylinder(d=20.000, h=384.000, center=true);
  }
}

// World assembly mounting transform (global machine frame, mm / deg):
// translate([0.000, 0.000, -462.000]) rotate([0.000, 0.000, 0.000]) part_S4_1_02();

part_S4_1_02();
